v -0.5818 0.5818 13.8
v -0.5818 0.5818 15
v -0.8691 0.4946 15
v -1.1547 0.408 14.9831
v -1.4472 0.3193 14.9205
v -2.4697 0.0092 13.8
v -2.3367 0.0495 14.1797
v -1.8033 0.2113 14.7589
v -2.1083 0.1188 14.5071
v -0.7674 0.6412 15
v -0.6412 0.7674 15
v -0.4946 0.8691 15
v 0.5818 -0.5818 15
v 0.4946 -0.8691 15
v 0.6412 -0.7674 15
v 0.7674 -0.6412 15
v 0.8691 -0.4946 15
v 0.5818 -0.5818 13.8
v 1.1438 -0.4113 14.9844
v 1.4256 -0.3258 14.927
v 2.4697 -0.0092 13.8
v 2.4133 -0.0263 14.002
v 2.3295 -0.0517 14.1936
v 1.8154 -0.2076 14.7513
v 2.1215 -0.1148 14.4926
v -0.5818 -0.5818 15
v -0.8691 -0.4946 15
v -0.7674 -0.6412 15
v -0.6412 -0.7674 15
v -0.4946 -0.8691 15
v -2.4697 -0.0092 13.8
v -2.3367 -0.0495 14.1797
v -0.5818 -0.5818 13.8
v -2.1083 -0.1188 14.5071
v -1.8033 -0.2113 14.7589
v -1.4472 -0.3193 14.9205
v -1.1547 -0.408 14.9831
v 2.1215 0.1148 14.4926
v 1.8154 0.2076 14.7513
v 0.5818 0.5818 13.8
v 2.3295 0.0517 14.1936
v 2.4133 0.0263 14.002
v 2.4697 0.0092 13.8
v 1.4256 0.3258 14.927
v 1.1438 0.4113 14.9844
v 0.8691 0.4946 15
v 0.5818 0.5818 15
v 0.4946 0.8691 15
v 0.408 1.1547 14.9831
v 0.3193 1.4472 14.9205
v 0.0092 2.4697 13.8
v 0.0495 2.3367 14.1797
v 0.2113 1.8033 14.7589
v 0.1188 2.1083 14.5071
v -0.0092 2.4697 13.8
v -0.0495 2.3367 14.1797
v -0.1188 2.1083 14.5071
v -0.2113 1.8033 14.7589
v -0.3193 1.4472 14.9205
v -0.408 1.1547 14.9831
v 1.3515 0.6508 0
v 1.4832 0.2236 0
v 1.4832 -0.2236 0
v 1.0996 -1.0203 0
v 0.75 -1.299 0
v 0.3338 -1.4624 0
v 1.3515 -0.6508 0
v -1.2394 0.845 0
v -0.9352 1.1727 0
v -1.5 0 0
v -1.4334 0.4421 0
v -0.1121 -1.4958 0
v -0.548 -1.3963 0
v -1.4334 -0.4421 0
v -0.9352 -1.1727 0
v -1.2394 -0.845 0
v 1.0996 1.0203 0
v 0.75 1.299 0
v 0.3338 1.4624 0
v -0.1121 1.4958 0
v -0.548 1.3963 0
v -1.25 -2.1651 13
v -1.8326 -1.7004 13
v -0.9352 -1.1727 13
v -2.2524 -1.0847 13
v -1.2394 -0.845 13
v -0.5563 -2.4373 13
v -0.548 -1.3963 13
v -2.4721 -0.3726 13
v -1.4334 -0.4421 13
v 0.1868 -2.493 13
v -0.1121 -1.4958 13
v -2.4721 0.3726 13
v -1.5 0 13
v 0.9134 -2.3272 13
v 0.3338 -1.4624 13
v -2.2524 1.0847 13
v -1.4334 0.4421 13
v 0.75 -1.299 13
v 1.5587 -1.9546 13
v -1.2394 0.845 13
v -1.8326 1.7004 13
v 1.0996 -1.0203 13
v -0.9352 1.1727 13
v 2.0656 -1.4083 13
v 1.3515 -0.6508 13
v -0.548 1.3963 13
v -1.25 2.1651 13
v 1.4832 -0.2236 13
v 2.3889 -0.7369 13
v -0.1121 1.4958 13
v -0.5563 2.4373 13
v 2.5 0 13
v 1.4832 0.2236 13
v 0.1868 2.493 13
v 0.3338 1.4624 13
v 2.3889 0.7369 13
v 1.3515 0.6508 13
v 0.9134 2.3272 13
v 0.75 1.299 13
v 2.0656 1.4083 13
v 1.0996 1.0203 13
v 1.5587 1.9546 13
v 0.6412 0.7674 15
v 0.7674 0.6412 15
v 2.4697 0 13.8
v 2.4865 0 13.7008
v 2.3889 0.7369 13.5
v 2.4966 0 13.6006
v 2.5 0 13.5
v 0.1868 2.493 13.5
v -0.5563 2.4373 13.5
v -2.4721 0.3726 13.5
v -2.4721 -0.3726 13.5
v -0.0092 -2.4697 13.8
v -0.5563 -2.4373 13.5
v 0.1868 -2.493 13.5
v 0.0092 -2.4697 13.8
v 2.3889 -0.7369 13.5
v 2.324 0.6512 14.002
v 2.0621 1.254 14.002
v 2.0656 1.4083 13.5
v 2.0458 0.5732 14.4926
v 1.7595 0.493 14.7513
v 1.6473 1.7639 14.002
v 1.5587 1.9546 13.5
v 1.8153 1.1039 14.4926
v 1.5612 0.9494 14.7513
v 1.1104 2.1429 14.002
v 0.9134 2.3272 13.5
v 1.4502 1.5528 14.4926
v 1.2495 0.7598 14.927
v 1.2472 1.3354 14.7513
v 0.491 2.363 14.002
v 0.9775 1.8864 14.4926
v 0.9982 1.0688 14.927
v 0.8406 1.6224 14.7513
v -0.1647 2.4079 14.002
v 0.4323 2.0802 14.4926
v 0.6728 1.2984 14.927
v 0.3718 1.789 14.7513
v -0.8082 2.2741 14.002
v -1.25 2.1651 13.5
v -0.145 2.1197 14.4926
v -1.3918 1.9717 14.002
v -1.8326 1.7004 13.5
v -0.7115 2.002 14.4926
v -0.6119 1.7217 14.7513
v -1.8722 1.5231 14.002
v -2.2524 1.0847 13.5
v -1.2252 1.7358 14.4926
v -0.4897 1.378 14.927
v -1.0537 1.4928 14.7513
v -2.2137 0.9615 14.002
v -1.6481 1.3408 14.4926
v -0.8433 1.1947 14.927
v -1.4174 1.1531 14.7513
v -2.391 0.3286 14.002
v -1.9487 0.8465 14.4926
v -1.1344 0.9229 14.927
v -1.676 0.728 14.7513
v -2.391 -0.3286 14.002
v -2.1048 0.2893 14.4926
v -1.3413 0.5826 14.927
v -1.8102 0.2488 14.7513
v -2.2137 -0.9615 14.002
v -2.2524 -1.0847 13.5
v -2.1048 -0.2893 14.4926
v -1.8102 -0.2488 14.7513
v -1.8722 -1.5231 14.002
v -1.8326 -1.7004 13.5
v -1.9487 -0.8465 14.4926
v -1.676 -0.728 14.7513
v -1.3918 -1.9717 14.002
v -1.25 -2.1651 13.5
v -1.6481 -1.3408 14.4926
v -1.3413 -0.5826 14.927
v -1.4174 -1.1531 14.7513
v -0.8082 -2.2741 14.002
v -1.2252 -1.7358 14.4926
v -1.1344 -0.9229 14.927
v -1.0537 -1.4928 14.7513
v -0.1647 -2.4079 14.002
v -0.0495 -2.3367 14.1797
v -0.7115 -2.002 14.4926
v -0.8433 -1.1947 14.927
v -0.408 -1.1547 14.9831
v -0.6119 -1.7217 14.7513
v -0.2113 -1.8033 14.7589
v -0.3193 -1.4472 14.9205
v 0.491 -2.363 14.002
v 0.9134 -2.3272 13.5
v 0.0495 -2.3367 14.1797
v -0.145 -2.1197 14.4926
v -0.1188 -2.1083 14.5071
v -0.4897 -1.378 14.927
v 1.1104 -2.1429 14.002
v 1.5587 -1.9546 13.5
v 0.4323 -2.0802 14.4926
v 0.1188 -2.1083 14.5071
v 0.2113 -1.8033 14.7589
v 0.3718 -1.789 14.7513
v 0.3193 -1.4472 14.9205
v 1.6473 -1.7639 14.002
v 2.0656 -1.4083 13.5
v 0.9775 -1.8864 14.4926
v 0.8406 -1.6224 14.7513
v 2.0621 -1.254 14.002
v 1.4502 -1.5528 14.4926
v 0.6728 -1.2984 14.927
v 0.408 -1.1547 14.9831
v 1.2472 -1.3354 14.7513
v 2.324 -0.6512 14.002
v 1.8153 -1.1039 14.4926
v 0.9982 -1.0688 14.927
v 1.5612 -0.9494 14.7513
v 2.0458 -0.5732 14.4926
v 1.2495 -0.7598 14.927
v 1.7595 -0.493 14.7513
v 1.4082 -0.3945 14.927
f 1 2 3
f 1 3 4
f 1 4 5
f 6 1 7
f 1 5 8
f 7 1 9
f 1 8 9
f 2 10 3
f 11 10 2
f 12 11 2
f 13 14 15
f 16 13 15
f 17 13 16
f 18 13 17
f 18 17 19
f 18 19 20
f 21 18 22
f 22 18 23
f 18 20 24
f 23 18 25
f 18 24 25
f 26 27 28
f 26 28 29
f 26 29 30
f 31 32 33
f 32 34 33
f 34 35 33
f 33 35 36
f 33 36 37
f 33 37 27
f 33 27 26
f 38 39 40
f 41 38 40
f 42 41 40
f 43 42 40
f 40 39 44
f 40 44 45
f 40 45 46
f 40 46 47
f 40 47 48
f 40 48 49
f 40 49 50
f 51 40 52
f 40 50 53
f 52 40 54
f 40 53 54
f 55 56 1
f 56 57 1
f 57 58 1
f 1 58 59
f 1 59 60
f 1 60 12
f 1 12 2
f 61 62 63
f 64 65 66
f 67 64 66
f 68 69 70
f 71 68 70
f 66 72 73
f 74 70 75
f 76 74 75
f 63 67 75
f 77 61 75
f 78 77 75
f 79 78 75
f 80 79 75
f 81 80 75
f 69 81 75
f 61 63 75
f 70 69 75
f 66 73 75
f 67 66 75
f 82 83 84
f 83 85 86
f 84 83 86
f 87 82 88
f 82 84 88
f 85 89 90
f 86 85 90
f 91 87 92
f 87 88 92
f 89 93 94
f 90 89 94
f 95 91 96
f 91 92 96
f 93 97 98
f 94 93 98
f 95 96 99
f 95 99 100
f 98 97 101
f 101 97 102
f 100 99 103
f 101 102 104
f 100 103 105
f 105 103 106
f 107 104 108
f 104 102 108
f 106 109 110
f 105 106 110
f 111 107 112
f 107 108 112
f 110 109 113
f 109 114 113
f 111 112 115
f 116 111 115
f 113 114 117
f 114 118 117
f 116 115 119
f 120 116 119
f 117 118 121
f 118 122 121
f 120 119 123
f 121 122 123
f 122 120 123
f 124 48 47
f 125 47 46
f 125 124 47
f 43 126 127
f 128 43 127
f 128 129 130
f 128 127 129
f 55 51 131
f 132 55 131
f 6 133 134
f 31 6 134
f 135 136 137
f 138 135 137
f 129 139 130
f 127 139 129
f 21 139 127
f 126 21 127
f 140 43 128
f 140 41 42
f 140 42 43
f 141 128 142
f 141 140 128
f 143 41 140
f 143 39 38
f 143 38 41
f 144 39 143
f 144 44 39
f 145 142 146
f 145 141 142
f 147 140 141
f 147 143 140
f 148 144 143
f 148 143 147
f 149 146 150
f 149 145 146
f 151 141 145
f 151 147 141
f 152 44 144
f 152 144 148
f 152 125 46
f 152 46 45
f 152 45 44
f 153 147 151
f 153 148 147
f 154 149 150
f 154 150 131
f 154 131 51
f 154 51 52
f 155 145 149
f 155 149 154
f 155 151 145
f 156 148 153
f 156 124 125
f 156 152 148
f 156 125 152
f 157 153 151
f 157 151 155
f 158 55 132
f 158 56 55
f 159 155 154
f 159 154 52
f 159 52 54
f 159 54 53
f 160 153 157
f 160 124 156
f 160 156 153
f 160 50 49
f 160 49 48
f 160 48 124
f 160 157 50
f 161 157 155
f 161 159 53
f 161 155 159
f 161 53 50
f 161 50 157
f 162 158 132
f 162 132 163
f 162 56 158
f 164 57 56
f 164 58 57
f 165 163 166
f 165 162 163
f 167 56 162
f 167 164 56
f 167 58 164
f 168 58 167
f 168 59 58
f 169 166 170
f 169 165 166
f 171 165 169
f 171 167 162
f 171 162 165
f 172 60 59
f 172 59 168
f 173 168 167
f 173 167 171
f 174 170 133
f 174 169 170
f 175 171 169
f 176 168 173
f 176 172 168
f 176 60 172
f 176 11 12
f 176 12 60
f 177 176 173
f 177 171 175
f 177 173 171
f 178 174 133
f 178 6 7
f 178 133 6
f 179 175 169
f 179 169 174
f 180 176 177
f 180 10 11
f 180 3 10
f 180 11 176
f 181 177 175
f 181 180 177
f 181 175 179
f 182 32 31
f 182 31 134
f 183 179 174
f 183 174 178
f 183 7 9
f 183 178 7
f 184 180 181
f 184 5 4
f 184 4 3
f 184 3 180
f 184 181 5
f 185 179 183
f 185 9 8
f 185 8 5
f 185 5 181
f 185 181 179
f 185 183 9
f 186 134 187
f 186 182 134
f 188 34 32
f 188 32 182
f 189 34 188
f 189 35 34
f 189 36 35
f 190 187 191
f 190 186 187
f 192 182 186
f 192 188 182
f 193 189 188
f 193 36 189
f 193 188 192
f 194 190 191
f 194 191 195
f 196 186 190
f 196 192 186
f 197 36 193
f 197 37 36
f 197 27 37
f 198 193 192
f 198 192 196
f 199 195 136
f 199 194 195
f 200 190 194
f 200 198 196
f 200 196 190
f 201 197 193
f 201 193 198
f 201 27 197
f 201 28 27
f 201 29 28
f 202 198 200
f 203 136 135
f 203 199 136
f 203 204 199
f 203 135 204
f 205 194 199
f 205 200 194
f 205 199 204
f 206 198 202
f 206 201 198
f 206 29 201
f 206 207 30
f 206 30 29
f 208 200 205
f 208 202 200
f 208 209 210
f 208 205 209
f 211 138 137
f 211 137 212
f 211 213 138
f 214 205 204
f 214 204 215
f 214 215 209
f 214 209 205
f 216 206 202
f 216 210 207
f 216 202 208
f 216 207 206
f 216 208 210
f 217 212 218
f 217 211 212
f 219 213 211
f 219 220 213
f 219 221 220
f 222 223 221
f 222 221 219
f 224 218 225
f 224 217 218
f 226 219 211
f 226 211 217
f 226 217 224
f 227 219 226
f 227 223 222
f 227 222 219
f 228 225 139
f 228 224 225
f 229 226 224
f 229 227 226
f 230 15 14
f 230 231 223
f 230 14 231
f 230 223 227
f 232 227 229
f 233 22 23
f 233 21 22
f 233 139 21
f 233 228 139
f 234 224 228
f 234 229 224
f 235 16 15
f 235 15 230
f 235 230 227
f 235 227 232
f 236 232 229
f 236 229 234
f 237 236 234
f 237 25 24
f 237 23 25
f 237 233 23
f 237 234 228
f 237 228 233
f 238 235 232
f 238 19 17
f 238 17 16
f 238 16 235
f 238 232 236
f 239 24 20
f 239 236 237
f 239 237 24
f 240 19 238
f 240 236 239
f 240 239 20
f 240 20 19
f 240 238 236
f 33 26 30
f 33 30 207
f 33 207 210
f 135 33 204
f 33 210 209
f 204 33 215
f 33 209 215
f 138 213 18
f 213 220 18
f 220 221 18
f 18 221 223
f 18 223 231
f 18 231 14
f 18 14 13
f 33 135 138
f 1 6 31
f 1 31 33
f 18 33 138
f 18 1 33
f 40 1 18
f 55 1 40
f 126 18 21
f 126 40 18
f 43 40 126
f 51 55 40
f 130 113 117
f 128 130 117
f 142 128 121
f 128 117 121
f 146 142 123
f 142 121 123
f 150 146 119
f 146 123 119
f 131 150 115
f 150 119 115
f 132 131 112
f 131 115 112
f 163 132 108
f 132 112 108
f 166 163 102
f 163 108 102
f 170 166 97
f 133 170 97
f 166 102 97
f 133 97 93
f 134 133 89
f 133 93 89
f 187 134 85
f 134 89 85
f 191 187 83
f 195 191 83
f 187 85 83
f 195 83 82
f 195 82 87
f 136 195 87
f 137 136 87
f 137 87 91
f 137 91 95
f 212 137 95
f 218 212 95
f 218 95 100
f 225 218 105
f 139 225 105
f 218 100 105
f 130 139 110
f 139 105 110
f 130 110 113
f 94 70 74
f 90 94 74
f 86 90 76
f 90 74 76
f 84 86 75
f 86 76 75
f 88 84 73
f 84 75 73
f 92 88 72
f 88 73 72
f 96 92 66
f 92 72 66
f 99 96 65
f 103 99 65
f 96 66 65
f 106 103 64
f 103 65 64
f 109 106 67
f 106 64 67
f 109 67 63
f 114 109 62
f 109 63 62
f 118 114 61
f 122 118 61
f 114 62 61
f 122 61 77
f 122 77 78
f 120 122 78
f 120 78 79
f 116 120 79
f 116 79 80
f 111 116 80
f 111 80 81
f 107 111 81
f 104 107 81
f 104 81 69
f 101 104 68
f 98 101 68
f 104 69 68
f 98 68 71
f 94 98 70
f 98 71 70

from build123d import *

# Parameters (mm, degrees)
SKETCH1_R           = 1.5
BOSS_EXTRUDE1_DEPTH = 13
SKETCH2_R           = 2.5
BOSS_EXTRUDE2_DEPTH = 2
FILLET1_R           = 1.5
CUT_EXTRUDE1_DEPTH  = 1.2


with BuildPart() as part:
    # Sketch1 → Boss-Extrude1 (new body)
    with BuildSketch(Plane.XY):
        with Locations(Location((0, 0, 0), (0, 0, 180))):
            Circle(SKETCH1_R)
    extrude(amount=BOSS_EXTRUDE1_DEPTH)

    # Sketch2 → Boss-Extrude2 (add)
    with BuildSketch(Plane.XY.offset(13)):
        Circle(SKETCH2_R)
    extrude(amount=BOSS_EXTRUDE2_DEPTH)

    # Fillet1
    fillet1_edges = [part.edges().sort_by_distance(p)[0] for p in [
        (-2.5, 0, 15),
    ]]
    fillet(fillet1_edges, radius=FILLET1_R)

    # Sketch3 → Cut-Extrude1 (cut)
    with BuildSketch(Plane.XY.offset(15)):
        Polygon((2.5, 0), (0.58177786, 0.58177786), (0, 2.5), (-0.58177786, 0.58177786), (-2.5, 0), (-0.58177786, -0.58177786), (0, -2.5), (0.58177786, -0.58177786), align=None)
    extrude(amount=-CUT_EXTRUDE1_DEPTH, mode=Mode.SUBTRACT)


solid = part.part
